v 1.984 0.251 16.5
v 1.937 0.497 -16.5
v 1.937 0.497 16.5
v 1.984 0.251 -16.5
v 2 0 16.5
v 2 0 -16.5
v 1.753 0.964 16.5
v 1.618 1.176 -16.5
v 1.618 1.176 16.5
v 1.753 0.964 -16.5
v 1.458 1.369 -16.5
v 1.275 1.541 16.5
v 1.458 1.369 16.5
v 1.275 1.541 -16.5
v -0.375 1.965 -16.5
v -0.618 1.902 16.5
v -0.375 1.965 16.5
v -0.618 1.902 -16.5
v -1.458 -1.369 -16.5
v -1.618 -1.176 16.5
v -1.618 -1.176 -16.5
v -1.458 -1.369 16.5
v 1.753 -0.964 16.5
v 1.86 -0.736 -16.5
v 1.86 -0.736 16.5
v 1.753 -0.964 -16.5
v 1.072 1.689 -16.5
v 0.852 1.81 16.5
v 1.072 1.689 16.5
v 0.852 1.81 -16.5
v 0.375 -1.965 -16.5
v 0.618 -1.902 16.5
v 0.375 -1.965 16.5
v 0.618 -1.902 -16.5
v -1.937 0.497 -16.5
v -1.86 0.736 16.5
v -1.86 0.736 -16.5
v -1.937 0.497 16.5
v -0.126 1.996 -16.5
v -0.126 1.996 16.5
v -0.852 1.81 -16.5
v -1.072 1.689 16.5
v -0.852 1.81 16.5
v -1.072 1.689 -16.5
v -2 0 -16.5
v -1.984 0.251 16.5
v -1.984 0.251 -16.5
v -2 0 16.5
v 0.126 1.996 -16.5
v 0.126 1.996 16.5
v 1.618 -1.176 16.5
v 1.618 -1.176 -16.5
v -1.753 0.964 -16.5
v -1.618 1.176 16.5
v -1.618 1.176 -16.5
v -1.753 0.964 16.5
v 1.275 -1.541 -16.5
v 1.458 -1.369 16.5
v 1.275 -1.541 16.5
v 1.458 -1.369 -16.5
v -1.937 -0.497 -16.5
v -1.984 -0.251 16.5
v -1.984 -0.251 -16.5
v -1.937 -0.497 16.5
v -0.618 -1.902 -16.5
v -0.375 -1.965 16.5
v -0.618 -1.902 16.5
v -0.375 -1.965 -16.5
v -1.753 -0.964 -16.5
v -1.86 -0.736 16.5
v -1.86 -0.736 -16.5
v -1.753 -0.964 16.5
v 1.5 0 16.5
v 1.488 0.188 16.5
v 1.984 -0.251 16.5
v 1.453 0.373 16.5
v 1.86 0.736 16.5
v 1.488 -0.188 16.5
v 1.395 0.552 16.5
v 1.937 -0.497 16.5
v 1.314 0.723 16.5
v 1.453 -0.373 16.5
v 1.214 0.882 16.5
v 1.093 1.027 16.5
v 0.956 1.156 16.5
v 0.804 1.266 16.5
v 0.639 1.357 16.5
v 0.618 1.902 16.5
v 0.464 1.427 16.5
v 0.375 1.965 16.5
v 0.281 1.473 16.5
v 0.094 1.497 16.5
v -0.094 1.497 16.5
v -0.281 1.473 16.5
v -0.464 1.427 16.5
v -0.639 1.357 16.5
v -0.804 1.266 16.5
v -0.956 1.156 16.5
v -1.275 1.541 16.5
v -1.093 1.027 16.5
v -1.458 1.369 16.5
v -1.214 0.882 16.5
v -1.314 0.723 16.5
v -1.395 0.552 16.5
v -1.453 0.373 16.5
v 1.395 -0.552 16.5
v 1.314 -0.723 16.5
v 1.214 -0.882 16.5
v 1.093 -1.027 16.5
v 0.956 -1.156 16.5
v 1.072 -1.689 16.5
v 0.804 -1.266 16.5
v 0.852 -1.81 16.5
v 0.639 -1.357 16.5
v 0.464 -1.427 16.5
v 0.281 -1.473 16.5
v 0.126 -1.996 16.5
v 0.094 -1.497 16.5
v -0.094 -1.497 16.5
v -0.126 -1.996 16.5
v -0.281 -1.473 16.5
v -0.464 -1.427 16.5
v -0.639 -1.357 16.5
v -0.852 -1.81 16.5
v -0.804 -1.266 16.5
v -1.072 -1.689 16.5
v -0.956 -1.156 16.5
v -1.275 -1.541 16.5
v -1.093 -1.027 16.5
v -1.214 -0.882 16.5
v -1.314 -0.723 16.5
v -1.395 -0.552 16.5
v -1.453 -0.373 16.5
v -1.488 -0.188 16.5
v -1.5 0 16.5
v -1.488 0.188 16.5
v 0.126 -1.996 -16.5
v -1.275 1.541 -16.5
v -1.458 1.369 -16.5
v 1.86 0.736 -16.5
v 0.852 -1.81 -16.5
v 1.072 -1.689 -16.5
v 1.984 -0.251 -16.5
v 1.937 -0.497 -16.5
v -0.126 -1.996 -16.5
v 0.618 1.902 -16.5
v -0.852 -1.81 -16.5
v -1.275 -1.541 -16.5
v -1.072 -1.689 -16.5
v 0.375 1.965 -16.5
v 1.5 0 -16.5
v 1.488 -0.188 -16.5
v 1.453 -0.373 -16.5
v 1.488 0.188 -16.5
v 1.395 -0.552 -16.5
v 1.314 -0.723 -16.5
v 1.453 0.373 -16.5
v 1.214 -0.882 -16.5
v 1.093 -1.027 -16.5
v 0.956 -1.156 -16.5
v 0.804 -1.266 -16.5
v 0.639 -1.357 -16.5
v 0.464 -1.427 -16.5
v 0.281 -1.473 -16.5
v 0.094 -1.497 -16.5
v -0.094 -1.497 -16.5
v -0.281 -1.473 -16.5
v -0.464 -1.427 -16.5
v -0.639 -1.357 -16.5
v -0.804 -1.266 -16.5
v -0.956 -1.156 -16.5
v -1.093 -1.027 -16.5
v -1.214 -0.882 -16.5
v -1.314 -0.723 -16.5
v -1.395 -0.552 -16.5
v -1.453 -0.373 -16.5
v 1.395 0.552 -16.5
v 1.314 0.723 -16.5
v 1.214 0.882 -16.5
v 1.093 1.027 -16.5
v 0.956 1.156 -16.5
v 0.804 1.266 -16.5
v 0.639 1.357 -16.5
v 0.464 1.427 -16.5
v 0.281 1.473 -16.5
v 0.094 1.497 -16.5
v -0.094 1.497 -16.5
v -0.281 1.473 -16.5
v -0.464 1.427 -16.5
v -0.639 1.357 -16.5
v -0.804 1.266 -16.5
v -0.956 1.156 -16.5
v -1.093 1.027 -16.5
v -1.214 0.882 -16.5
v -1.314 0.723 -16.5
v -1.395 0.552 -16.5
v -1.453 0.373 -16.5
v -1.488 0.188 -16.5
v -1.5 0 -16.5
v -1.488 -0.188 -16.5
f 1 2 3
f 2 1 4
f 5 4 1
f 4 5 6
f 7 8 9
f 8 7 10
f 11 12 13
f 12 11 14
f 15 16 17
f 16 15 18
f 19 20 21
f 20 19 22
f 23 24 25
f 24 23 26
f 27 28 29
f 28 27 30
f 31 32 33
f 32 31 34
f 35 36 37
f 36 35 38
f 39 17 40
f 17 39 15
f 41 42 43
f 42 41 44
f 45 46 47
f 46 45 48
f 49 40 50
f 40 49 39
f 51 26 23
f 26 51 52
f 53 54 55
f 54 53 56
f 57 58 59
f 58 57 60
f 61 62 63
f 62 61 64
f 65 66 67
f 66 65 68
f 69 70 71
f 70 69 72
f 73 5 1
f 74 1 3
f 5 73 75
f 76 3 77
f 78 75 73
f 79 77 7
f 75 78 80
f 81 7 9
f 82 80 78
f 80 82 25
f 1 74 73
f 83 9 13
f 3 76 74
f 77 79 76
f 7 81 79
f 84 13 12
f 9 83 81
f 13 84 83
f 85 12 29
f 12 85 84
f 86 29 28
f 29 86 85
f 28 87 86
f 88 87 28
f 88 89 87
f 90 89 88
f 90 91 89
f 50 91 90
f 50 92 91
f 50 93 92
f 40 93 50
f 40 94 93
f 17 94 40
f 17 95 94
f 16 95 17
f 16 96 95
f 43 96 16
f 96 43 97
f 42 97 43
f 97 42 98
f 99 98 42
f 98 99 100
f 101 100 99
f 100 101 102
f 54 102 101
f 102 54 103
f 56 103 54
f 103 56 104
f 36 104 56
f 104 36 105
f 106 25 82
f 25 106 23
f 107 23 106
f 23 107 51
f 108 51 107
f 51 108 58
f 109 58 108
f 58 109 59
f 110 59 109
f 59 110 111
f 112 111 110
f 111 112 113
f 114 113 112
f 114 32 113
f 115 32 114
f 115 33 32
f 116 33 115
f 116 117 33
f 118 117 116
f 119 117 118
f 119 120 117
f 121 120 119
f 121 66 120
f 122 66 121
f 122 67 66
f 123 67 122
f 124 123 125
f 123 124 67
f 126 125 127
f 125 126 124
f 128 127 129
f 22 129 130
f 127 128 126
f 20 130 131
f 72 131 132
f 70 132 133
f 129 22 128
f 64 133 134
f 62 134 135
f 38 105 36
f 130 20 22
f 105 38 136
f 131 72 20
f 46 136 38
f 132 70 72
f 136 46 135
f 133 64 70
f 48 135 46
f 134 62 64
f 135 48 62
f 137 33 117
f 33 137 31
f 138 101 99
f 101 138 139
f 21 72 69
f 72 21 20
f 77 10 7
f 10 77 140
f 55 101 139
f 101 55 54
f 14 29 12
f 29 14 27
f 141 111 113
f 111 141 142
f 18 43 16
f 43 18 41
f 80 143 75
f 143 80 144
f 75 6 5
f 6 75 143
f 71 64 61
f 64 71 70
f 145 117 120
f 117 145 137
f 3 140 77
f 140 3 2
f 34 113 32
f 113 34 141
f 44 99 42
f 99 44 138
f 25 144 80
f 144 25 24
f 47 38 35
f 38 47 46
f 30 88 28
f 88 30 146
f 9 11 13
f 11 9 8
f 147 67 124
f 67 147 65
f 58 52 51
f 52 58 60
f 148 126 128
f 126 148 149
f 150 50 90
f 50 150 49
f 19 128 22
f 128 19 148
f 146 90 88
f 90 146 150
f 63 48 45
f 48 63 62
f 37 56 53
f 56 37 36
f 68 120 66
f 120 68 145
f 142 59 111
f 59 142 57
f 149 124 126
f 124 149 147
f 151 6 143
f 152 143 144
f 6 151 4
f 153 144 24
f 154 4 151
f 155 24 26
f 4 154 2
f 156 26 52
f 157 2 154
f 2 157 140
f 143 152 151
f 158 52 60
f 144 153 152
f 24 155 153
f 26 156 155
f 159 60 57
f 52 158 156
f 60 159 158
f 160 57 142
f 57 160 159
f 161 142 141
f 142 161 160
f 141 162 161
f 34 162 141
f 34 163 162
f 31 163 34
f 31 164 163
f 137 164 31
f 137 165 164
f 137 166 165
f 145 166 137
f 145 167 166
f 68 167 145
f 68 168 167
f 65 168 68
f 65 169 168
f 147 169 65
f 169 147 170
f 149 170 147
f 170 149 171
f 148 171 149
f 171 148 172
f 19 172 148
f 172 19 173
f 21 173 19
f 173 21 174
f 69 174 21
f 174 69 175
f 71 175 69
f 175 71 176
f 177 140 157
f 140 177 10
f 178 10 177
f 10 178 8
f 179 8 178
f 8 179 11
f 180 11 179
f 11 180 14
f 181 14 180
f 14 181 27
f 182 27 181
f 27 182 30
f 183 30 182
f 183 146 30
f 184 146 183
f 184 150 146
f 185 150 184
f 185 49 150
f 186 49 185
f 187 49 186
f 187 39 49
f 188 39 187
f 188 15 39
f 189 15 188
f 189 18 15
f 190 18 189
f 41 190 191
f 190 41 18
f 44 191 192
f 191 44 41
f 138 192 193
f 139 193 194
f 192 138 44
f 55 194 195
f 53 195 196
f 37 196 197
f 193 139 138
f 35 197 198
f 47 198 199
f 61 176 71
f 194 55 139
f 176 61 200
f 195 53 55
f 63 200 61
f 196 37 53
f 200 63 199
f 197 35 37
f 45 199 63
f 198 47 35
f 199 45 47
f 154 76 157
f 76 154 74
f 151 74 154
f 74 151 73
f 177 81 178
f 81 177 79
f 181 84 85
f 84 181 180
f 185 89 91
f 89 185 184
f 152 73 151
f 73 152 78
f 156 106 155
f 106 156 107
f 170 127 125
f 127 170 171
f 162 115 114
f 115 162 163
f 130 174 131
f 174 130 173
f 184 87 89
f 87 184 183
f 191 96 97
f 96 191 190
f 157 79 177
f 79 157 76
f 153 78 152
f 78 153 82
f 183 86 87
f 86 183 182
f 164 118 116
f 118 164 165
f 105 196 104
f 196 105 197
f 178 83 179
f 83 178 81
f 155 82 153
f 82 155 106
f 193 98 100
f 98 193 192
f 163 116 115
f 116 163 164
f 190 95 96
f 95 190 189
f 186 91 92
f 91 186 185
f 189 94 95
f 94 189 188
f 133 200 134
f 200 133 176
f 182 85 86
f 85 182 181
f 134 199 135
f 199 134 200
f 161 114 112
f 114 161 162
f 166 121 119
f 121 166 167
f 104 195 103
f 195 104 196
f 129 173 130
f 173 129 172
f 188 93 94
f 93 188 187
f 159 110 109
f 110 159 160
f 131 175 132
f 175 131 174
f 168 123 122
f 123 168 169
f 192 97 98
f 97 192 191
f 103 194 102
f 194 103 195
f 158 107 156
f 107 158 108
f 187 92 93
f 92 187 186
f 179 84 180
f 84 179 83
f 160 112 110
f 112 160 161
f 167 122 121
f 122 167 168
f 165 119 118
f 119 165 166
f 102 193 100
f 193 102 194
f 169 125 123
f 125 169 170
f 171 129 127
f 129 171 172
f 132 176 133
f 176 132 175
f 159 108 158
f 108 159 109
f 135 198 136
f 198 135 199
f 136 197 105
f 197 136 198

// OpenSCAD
$fn = 50;


difference() {
	union() {
		translate(v = [0, 0, -16.5000000000]) {
			cylinder(h = 33, r = 2.0000000000);
		}
	}
	union() {
		translate(v = [0, 0, -100.0000000000]) {
			cylinder(h = 200, r = 1.5000000000);
		}
	}
}
